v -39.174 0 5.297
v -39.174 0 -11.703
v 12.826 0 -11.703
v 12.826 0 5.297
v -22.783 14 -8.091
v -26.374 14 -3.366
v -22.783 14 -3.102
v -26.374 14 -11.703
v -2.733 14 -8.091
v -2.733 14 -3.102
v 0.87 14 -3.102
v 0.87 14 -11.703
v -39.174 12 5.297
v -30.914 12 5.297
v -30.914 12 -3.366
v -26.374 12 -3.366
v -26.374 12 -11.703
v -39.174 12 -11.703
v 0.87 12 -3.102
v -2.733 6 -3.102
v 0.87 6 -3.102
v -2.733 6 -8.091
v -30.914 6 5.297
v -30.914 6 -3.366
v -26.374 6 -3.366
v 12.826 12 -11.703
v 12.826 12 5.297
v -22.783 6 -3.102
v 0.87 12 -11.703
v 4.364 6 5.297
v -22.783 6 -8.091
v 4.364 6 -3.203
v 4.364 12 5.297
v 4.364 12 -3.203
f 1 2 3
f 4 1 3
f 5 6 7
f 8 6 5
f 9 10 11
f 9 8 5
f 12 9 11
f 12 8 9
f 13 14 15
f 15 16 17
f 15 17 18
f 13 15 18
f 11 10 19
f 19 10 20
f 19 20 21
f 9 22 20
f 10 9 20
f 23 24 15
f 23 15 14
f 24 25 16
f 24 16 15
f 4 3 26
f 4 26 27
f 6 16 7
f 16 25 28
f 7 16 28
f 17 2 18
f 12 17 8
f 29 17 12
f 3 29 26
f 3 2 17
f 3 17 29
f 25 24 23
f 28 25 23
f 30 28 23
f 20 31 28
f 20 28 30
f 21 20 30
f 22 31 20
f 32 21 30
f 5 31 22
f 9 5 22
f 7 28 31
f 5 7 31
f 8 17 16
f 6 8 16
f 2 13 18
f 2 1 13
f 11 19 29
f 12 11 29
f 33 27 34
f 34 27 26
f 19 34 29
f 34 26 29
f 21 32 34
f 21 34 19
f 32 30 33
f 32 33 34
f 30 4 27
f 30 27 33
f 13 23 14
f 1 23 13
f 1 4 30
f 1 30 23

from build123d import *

# Parameters (mm, degrees)
SKETCH1_W           = 52
SKETCH1_H           = 17
BOSS_EXTRUDE1_DEPTH = 6
BOSS_EXTRUDE2_DEPTH = 6
BOSS_EXTRUDE4_DEPTH = 8
BOSS_EXTRUDE5_DEPTH = 6


with BuildPart() as part:
    # Sketch1 → Boss-Extrude1 (new body)
    with BuildSketch(Plane(origin=(0, 0, 0), x_dir=(1, 0, 0), z_dir=(0, 1, 0))):
        with Locations((-13.173913043, 3.202898551)):
            Rectangle(SKETCH1_W, SKETCH1_H)
    extrude(amount=BOSS_EXTRUDE1_DEPTH)

    # Sketch2 → Boss-Extrude2 (add)
    with BuildSketch(Plane(origin=(0, 6, 0), x_dir=(1, 0, 0), z_dir=(0, 1, 0))):
        Polygon((-39.173913043, 11.702898551), (-26.373913043, 11.702898551), (-26.373913043, 3.365569346), (-30.913828569, 3.365569346), (-30.913828569, -5.297101449), (-39.173913043, -5.297101449), align=None)
    extrude(amount=BOSS_EXTRUDE2_DEPTH)

    # Sketch3 → Boss-Extrude4 (add)
    with BuildSketch(Plane(origin=(0, 6, 0), x_dir=(1, 0, 0), z_dir=(0, 1, 0))):
        Polygon((0.870186747, 11.702898551), (-26.373913043, 11.702898551), (-26.373913043, 3.365569346), (-22.783033953, 3.101787471), (-22.783033953, 8.091138713), (-2.733233594, 8.091138713), (-2.733233594, 3.101787471), (0.870186747, 3.101787471), align=None)
    extrude(amount=BOSS_EXTRUDE4_DEPTH)

    # Sketch4 → Boss-Extrude5 (add)
    with BuildSketch(Plane(origin=(0, 6, 0), x_dir=(1, 0, 0), z_dir=(0, 1, 0))):
        Polygon((0.870186747, 11.702898551), (12.826086957, 11.702898551), (12.826086957, -5.297101449), (4.364373788, -5.297101449), (4.364373788, 3.202898551), (0.870186747, 3.101787471), align=None)
    extrude(amount=BOSS_EXTRUDE5_DEPTH)


solid = part.part
